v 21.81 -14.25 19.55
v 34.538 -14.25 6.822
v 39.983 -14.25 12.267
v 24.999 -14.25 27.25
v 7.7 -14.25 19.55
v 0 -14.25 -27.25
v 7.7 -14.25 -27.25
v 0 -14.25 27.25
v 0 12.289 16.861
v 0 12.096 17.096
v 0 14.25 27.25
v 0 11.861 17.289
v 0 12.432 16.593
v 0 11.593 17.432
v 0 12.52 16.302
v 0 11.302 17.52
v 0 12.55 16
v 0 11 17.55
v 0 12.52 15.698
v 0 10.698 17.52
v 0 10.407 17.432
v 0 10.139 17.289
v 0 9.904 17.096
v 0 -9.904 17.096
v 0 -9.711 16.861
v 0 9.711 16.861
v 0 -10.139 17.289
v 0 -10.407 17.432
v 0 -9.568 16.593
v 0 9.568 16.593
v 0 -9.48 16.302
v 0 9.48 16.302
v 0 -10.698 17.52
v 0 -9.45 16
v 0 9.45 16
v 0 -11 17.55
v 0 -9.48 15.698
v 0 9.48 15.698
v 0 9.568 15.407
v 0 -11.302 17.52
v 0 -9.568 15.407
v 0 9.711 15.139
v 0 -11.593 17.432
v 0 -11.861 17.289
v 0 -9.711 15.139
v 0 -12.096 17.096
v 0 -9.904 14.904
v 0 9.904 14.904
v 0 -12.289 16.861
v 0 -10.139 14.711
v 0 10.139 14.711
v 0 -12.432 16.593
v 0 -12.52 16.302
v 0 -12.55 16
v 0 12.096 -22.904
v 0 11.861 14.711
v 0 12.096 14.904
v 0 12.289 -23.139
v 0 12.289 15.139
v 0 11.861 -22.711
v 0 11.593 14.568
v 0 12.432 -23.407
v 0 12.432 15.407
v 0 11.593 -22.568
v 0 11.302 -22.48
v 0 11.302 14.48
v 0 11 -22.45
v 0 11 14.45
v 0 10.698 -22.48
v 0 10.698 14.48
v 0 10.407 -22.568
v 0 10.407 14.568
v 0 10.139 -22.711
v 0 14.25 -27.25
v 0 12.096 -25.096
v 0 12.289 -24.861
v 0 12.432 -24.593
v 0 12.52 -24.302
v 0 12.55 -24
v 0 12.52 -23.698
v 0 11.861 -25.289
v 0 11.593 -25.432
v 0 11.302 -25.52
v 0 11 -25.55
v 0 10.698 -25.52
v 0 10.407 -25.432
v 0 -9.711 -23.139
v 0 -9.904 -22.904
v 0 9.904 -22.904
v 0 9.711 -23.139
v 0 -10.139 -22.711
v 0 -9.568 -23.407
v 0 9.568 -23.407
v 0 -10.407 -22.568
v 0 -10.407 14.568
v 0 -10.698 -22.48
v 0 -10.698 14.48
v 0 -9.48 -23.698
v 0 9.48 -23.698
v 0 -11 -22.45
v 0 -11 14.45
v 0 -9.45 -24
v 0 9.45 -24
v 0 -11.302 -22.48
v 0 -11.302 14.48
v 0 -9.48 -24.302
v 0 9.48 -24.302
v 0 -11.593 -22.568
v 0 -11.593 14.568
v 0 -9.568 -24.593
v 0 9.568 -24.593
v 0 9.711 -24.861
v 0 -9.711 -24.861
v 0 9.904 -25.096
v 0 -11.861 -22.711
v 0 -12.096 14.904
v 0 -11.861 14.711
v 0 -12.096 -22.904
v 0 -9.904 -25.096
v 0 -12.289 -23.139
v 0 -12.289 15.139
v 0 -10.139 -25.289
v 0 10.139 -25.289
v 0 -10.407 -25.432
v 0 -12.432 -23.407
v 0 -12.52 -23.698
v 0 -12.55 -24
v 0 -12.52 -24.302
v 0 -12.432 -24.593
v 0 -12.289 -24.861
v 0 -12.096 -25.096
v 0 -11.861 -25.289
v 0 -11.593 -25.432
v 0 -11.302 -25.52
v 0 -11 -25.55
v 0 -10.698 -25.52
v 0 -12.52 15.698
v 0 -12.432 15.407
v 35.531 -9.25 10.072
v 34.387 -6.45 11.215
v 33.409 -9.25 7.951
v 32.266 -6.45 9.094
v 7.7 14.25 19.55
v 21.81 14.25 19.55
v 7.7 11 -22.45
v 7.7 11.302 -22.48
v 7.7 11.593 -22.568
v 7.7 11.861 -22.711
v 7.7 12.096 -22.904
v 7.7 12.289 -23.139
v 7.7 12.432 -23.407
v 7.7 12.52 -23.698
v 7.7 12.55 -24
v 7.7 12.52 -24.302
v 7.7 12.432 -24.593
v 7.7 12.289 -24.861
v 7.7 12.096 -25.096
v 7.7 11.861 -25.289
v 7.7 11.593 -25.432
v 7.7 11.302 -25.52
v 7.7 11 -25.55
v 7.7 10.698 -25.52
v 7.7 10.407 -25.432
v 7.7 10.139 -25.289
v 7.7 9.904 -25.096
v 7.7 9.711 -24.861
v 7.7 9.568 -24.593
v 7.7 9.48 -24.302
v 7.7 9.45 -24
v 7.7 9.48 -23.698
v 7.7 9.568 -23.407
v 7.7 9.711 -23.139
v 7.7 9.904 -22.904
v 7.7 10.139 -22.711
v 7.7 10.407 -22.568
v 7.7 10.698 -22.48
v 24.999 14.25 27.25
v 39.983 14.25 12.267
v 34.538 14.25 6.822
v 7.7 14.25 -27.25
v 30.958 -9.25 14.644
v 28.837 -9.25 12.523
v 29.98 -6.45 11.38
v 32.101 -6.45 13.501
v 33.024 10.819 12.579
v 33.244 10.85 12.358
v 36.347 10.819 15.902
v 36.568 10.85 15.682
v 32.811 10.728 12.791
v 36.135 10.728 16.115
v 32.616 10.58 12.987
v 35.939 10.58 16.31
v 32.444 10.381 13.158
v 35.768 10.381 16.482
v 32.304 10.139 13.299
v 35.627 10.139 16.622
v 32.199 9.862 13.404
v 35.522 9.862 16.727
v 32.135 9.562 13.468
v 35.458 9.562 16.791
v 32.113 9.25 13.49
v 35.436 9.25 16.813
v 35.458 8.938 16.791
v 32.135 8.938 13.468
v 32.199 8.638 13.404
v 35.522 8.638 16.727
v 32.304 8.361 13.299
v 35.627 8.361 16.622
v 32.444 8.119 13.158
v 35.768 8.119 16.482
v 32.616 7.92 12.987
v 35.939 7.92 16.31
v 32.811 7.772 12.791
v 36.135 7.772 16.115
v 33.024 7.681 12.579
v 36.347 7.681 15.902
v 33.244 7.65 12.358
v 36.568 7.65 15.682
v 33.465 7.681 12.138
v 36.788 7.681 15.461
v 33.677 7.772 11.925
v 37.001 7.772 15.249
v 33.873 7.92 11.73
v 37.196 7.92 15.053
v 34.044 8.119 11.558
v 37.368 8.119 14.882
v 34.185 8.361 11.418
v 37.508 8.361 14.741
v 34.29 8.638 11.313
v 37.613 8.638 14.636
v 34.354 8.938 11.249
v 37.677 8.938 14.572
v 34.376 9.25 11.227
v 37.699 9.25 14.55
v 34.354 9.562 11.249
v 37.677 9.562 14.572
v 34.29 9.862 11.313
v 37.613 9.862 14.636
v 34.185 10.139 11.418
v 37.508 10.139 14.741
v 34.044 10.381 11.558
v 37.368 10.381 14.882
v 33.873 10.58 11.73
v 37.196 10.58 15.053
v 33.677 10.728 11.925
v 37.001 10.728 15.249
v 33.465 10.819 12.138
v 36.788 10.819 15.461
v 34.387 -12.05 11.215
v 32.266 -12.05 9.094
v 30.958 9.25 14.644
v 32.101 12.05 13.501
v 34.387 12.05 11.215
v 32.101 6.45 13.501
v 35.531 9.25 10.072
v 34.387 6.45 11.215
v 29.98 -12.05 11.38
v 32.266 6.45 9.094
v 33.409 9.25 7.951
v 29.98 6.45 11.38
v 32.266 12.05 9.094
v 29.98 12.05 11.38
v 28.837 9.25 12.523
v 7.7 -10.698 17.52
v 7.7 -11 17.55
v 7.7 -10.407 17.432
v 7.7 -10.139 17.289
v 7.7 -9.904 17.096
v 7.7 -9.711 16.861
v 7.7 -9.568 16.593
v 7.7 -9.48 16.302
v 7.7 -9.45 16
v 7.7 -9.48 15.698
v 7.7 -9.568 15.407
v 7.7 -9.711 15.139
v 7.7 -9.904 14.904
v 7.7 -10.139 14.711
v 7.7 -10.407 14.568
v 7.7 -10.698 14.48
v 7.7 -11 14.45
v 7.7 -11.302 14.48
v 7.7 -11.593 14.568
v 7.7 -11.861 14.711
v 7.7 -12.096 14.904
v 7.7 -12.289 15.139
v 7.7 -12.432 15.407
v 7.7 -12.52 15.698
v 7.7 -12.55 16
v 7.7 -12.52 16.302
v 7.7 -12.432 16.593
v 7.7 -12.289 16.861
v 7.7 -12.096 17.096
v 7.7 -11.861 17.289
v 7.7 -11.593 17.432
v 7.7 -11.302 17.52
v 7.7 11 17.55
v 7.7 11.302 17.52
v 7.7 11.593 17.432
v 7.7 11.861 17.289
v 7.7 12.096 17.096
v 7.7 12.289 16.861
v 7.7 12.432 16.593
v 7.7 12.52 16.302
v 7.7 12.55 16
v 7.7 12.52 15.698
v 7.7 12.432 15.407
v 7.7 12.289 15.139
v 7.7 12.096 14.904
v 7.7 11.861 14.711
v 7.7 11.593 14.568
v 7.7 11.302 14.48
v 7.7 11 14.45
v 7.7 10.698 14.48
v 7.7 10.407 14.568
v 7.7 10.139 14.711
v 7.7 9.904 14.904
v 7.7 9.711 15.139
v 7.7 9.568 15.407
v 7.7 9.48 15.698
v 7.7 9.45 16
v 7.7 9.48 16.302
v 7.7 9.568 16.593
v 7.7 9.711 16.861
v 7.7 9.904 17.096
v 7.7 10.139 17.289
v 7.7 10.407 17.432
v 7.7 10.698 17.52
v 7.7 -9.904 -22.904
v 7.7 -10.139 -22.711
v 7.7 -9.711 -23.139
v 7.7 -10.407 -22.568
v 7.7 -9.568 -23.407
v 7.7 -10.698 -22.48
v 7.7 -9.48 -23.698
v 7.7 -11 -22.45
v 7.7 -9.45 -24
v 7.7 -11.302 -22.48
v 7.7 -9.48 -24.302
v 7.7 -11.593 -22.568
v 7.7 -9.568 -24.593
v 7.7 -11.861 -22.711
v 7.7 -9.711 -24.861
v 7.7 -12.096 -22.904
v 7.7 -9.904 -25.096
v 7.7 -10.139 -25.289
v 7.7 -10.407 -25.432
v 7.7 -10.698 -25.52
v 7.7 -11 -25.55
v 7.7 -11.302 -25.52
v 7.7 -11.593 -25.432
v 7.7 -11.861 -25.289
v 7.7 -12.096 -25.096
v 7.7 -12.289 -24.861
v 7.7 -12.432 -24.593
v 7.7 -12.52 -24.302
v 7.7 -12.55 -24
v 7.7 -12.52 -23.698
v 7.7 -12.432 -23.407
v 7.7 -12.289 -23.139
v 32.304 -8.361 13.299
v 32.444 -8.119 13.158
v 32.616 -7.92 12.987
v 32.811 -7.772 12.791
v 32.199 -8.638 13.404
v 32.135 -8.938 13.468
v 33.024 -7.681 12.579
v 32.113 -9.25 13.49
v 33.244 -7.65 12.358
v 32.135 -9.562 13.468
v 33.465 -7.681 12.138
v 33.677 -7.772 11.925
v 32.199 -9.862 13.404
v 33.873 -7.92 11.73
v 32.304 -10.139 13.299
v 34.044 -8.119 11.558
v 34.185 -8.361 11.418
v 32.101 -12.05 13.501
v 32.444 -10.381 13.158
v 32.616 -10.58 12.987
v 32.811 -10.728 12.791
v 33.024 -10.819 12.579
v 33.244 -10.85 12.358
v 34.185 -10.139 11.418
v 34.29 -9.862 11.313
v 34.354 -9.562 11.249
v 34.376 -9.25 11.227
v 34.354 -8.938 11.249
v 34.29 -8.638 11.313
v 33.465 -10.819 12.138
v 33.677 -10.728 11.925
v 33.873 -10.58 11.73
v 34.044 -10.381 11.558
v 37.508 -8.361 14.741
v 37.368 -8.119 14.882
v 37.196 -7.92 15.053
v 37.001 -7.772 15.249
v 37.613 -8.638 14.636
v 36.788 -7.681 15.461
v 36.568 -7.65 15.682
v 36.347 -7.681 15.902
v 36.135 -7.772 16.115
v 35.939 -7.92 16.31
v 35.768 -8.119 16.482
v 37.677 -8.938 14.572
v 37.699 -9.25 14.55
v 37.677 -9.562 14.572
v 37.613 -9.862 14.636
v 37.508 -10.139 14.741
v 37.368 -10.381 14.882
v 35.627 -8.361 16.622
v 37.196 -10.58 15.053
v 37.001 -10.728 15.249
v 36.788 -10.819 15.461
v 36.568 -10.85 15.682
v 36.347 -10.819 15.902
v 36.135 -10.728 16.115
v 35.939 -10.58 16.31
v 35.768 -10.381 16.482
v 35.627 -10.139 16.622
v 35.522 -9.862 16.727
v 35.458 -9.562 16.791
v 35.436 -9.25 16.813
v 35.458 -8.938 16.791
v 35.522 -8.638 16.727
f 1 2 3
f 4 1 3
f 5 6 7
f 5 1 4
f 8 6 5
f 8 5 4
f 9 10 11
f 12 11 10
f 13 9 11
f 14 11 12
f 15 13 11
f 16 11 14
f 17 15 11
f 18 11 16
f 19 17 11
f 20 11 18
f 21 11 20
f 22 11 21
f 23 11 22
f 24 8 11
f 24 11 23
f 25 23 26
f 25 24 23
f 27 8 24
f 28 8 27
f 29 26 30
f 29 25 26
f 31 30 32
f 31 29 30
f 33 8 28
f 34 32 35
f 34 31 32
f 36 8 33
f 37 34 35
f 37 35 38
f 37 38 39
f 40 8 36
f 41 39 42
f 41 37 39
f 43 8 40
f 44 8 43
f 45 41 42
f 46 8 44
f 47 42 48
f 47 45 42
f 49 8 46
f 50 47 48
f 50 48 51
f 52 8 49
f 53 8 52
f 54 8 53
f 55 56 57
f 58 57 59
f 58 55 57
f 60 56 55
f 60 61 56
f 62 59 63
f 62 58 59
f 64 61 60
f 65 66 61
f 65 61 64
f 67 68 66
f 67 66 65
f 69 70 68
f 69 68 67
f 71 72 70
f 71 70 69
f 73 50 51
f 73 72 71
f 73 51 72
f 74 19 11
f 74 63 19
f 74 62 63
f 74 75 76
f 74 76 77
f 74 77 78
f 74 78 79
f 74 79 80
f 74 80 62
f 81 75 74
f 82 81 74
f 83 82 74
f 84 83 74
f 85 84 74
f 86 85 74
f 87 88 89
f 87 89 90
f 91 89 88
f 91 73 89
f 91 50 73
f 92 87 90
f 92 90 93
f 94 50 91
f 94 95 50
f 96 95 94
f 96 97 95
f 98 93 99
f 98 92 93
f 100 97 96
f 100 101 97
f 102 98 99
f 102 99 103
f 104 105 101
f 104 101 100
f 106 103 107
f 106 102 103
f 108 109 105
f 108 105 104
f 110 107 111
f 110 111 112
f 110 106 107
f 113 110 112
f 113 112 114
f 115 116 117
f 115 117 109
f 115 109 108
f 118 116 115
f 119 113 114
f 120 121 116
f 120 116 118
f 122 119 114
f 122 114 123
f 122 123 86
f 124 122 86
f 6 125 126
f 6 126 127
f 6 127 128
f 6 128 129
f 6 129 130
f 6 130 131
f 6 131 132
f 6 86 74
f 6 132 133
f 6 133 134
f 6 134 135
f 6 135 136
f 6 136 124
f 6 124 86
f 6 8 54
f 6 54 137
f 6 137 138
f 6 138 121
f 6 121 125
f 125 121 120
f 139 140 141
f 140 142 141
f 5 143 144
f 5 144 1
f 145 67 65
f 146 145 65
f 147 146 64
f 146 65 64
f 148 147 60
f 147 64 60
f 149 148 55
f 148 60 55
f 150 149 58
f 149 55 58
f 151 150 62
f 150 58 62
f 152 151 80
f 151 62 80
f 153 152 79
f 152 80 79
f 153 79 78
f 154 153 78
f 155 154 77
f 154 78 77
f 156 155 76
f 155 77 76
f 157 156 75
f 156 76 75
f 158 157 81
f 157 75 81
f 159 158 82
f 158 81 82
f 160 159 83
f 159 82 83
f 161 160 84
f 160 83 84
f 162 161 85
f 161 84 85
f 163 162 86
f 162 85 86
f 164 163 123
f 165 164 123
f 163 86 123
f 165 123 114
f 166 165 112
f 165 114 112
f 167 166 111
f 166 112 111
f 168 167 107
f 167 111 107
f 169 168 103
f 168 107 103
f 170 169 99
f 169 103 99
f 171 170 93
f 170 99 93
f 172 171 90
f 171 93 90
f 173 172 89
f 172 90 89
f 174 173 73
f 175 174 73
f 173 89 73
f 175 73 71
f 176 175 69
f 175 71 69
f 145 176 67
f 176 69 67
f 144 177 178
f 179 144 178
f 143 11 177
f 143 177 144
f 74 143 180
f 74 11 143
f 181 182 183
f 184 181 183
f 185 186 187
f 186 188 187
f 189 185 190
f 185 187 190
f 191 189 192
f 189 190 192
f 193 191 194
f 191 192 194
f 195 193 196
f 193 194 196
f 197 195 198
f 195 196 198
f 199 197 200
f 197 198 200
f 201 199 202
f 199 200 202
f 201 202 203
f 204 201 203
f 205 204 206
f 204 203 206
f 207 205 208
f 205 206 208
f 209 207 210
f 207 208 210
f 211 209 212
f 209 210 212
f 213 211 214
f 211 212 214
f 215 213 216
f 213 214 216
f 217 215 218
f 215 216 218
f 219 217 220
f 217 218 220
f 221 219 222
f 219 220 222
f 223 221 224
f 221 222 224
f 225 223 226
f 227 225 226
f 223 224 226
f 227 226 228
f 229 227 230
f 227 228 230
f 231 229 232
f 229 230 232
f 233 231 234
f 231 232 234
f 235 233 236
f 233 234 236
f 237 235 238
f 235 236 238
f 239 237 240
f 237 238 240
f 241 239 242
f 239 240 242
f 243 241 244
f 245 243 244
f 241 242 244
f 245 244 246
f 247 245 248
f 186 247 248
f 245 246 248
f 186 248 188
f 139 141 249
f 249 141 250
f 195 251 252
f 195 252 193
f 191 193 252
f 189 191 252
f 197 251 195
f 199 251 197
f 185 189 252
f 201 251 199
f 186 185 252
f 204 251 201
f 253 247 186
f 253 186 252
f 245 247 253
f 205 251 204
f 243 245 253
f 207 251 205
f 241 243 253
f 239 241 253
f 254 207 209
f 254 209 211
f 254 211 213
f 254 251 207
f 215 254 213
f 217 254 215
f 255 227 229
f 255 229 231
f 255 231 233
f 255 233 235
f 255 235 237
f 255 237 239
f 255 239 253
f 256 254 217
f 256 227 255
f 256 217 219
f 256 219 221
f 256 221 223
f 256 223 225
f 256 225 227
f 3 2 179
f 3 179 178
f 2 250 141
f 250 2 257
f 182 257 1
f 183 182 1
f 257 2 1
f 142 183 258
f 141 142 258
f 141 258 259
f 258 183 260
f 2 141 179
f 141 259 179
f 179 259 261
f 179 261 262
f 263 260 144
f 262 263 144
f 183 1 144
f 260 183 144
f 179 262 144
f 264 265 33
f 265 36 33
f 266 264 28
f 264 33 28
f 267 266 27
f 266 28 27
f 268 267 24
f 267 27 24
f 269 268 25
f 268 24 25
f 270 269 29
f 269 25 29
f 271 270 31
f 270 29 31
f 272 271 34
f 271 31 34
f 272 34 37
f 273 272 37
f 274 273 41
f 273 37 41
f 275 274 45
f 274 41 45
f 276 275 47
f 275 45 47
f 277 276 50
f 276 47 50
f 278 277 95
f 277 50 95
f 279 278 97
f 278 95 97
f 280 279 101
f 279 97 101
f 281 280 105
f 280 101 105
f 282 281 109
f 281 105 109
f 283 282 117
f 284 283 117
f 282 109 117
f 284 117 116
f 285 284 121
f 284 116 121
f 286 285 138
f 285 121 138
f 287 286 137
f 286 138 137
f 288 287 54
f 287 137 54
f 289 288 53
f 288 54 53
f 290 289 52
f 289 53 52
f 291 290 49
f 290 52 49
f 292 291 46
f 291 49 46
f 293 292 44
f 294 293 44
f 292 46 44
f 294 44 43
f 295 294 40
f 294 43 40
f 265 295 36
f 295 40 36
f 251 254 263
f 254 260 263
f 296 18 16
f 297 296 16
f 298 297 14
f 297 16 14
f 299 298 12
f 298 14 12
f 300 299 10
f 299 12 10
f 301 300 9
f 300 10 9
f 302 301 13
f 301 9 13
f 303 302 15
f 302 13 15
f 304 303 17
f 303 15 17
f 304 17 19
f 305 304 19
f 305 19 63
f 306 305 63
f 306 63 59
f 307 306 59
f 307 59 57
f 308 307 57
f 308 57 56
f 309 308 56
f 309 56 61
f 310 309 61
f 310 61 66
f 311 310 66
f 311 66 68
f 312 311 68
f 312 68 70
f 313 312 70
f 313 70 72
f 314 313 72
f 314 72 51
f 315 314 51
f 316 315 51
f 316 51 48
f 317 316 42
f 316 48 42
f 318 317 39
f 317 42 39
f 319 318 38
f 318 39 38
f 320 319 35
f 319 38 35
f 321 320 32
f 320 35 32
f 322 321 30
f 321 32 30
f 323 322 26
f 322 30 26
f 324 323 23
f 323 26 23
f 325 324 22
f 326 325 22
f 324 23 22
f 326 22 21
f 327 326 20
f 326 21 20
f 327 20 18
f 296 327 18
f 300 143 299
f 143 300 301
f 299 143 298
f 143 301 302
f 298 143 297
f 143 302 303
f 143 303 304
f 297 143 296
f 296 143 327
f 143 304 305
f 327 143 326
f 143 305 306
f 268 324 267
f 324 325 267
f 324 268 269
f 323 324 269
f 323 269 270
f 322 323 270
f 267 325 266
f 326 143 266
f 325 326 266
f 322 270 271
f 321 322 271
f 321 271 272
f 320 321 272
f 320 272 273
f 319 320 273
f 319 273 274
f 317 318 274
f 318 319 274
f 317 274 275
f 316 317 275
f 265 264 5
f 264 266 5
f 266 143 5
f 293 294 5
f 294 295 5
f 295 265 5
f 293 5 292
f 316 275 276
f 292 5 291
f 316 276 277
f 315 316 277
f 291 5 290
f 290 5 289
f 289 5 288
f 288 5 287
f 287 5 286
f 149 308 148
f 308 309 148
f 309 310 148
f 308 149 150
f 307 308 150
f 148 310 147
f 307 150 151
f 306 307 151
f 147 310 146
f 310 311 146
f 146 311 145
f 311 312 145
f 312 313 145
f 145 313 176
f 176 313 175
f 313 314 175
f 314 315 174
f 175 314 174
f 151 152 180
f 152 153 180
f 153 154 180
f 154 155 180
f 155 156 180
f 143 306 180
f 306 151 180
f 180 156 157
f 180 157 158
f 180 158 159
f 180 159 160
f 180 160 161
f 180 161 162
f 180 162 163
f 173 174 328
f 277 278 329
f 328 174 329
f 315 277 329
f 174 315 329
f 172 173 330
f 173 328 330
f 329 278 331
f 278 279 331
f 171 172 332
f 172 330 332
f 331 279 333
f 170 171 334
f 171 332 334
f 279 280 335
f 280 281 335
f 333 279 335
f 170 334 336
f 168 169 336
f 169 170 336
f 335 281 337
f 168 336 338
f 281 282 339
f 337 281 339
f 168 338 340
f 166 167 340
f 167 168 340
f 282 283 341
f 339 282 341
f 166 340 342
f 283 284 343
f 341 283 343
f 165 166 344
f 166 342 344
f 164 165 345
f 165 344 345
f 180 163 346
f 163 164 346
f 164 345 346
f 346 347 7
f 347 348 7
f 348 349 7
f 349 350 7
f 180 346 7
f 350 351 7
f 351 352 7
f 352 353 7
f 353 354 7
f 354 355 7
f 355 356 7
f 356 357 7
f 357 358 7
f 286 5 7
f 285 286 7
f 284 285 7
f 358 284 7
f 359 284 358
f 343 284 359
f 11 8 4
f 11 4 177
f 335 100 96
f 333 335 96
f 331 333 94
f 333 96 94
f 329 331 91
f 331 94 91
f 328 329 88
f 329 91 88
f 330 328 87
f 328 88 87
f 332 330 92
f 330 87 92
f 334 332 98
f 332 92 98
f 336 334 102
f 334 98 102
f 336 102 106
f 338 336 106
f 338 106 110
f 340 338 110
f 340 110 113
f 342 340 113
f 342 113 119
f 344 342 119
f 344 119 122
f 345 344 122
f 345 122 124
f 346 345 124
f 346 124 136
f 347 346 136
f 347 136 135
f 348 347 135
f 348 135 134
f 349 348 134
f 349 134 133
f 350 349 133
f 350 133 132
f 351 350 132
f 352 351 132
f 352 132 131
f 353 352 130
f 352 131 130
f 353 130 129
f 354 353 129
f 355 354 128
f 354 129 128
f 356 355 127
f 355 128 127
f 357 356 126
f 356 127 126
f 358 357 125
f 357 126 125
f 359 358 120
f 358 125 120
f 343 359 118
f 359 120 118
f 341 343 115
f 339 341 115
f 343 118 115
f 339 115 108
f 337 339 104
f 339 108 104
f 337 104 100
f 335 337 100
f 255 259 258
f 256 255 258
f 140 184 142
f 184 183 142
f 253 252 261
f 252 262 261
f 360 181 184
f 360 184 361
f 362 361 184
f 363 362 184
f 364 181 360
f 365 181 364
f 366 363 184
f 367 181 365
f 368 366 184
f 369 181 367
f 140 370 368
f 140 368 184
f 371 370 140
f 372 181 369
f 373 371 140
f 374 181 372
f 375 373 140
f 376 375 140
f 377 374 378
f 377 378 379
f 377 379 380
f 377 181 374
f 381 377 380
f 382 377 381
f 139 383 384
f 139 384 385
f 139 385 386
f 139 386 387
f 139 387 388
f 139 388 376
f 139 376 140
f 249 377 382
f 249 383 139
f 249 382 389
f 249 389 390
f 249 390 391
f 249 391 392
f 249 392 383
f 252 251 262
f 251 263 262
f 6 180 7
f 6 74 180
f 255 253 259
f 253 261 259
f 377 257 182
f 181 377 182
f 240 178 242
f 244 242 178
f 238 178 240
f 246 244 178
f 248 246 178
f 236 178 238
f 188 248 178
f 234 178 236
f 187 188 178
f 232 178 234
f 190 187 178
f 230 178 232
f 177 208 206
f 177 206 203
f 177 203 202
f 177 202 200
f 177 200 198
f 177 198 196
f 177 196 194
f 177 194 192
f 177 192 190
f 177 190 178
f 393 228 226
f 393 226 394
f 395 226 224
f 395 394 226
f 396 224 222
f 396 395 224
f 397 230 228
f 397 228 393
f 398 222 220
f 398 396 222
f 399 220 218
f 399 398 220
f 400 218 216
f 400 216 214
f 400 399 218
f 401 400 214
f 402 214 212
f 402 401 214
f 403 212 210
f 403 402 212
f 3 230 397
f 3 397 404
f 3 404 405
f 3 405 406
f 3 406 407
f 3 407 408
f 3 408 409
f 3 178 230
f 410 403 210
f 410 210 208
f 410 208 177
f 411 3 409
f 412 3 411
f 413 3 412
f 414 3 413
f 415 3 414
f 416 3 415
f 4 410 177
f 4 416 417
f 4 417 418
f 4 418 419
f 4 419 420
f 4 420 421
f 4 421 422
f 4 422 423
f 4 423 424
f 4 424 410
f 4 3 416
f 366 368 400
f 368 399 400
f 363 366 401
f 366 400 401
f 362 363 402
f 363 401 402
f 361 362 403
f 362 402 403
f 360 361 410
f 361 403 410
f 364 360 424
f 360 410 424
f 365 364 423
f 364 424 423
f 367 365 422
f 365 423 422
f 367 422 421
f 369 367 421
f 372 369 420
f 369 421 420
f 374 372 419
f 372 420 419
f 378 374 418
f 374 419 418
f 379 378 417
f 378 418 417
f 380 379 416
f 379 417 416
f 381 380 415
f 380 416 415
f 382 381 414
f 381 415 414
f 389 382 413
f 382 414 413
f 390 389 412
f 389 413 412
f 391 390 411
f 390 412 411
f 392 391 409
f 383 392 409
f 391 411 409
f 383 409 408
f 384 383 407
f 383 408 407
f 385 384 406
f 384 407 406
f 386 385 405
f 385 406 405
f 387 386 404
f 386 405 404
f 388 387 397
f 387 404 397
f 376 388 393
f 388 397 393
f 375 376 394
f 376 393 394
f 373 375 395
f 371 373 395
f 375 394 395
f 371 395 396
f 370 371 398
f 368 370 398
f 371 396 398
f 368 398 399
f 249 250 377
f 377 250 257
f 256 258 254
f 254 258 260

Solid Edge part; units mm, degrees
sketch "Sketch1" plane through (0, 0, 0) normal (1, 0, 0) x (0, 1, 0)
  line L0 (-14.25, -27.25) -> (-14.25, 27.25)
  line L1 (-14.25, 27.25) -> (14.25, 27.25)
  line L2 (14.25, 27.25) -> (14.25, -27.25)
  line L3 (14.25, -27.25) -> (-14.25, -27.25)
extrude "Protrusion1" add sketch "Sketch1" along normal blind 7.7
sketch "Sketch2" plane through (7.7, 0, 0) normal (1, 0, 0) x (0, 1, 0)
  line L0 (14.25, 19.55) -> (-14.25, 19.55)
  line L1 (-14.25, 19.55) -> (-14.25, 27.25)
  line L2 (-14.25, 27.25) -> (14.25, 27.25)
  line L3 (14.25, 27.25) -> (14.25, 19.55)
extrude "Extrusionsausprägung_2" add sketch "Sketch2" along normal blind 14.11
hole "Bohrung_1" at (0, 11, -24) direction (1, 0, 0) diameter 3.1 end through all
pattern_linear "Pattern1" count 2 spacing 22 along (0, -1, 0) count 2 spacing 40 along (0, 0, 1) of "Bohrung_1"
draft "Formschräge_3" angle 45 neutral plane through (18.75, 0, 19.55) normal (0, 0, -1) pull direction (0, 0, -1) face at (21.81, 9.215, 26.0437)
sketch "Sketch3" plane through (29.505, 0, 27.245) normal (0.7071068, 0, -0.7071068) x (0, 1, 0)
  line L0 (-14.25, -10.8824) -> (14.25, -10.8824)
  line L1 (14.25, -10.8824) -> (14.25, -3.1824)
  line L2 (14.25, -3.1824) -> (-14.25, -3.1824)
  line L3 (-14.25, -3.1824) -> (-14.25, -10.8824)
  dimension "D1" = 28.5
  dimension "D2" = 7.7
extrude "Extrusionsausprägung_3" add sketch "Sketch3" along normal blind 18
sketch "Sketch4" plane through (32.5061, -14.25, 0) normal (0, -1, 0) x (1, 0, 0)
  line L0 (-5.2514, 24.9947) -> (-7.5067, 27.25)
extrude "Cutout1" cut sketch "Sketch4" against normal through all material side at (26.1624, -14.25, 26.1577)
hole "Bohrung_10" at (31.123, -9.25, 10.237) direction (0.7071068, 0, 0.7071068) diameter 3.2 end up to next
hole "Hole1" at (31.123, 9.25, 10.237) direction (0.7071068, 0, 0.7071068) diameter 3.2 end up to next
sketch "Sketch5" plane through (28.8811, 0, 12.4789) normal (-0.7071068, 0, -0.7071068) x (0.7071068, 0, -0.7071068)
  line L0 (4.7872, 12.05) -> (1.554, 12.05)
  line L1 (1.554, 12.05) -> (-0.0626, 9.25)
  line L2 (-0.0626, 9.25) -> (1.554, 6.45)
  line L3 (1.554, 6.45) -> (4.7872, 6.45)
  line L4 (4.7872, 6.45) -> (6.4038, 9.25)
  line L5 (6.4038, 9.25) -> (4.7872, 12.05)
  dimension "D1" = 5.6
extrude "Extrusionsausschnitt_2" cut sketch "Sketch5" against normal blind 3
sketch "Sketch6" plane through (28.8811, 0, 12.4789) normal (-0.7071068, 0, -0.7071068) x (0.7071068, 0, -0.7071068)
  line L0 (4.7872, -12.05) -> (6.4038, -9.25)
  line L1 (6.4038, -9.25) -> (4.7872, -6.45)
  line L2 (4.7872, -6.45) -> (1.554, -6.45)
  line L3 (1.554, -6.45) -> (-0.0626, -9.25)
  line L4 (-0.0626, -9.25) -> (1.554, -12.05)
  line L5 (1.554, -12.05) -> (4.7872, -12.05)
  dimension "D1" = 5.6
extrude "Extrusionsausschnitt_3" cut sketch "Sketch6" against normal blind 3
hole "Hole2" [suppressed]
hole "Hole3" [suppressed]
properties material "PVC"
